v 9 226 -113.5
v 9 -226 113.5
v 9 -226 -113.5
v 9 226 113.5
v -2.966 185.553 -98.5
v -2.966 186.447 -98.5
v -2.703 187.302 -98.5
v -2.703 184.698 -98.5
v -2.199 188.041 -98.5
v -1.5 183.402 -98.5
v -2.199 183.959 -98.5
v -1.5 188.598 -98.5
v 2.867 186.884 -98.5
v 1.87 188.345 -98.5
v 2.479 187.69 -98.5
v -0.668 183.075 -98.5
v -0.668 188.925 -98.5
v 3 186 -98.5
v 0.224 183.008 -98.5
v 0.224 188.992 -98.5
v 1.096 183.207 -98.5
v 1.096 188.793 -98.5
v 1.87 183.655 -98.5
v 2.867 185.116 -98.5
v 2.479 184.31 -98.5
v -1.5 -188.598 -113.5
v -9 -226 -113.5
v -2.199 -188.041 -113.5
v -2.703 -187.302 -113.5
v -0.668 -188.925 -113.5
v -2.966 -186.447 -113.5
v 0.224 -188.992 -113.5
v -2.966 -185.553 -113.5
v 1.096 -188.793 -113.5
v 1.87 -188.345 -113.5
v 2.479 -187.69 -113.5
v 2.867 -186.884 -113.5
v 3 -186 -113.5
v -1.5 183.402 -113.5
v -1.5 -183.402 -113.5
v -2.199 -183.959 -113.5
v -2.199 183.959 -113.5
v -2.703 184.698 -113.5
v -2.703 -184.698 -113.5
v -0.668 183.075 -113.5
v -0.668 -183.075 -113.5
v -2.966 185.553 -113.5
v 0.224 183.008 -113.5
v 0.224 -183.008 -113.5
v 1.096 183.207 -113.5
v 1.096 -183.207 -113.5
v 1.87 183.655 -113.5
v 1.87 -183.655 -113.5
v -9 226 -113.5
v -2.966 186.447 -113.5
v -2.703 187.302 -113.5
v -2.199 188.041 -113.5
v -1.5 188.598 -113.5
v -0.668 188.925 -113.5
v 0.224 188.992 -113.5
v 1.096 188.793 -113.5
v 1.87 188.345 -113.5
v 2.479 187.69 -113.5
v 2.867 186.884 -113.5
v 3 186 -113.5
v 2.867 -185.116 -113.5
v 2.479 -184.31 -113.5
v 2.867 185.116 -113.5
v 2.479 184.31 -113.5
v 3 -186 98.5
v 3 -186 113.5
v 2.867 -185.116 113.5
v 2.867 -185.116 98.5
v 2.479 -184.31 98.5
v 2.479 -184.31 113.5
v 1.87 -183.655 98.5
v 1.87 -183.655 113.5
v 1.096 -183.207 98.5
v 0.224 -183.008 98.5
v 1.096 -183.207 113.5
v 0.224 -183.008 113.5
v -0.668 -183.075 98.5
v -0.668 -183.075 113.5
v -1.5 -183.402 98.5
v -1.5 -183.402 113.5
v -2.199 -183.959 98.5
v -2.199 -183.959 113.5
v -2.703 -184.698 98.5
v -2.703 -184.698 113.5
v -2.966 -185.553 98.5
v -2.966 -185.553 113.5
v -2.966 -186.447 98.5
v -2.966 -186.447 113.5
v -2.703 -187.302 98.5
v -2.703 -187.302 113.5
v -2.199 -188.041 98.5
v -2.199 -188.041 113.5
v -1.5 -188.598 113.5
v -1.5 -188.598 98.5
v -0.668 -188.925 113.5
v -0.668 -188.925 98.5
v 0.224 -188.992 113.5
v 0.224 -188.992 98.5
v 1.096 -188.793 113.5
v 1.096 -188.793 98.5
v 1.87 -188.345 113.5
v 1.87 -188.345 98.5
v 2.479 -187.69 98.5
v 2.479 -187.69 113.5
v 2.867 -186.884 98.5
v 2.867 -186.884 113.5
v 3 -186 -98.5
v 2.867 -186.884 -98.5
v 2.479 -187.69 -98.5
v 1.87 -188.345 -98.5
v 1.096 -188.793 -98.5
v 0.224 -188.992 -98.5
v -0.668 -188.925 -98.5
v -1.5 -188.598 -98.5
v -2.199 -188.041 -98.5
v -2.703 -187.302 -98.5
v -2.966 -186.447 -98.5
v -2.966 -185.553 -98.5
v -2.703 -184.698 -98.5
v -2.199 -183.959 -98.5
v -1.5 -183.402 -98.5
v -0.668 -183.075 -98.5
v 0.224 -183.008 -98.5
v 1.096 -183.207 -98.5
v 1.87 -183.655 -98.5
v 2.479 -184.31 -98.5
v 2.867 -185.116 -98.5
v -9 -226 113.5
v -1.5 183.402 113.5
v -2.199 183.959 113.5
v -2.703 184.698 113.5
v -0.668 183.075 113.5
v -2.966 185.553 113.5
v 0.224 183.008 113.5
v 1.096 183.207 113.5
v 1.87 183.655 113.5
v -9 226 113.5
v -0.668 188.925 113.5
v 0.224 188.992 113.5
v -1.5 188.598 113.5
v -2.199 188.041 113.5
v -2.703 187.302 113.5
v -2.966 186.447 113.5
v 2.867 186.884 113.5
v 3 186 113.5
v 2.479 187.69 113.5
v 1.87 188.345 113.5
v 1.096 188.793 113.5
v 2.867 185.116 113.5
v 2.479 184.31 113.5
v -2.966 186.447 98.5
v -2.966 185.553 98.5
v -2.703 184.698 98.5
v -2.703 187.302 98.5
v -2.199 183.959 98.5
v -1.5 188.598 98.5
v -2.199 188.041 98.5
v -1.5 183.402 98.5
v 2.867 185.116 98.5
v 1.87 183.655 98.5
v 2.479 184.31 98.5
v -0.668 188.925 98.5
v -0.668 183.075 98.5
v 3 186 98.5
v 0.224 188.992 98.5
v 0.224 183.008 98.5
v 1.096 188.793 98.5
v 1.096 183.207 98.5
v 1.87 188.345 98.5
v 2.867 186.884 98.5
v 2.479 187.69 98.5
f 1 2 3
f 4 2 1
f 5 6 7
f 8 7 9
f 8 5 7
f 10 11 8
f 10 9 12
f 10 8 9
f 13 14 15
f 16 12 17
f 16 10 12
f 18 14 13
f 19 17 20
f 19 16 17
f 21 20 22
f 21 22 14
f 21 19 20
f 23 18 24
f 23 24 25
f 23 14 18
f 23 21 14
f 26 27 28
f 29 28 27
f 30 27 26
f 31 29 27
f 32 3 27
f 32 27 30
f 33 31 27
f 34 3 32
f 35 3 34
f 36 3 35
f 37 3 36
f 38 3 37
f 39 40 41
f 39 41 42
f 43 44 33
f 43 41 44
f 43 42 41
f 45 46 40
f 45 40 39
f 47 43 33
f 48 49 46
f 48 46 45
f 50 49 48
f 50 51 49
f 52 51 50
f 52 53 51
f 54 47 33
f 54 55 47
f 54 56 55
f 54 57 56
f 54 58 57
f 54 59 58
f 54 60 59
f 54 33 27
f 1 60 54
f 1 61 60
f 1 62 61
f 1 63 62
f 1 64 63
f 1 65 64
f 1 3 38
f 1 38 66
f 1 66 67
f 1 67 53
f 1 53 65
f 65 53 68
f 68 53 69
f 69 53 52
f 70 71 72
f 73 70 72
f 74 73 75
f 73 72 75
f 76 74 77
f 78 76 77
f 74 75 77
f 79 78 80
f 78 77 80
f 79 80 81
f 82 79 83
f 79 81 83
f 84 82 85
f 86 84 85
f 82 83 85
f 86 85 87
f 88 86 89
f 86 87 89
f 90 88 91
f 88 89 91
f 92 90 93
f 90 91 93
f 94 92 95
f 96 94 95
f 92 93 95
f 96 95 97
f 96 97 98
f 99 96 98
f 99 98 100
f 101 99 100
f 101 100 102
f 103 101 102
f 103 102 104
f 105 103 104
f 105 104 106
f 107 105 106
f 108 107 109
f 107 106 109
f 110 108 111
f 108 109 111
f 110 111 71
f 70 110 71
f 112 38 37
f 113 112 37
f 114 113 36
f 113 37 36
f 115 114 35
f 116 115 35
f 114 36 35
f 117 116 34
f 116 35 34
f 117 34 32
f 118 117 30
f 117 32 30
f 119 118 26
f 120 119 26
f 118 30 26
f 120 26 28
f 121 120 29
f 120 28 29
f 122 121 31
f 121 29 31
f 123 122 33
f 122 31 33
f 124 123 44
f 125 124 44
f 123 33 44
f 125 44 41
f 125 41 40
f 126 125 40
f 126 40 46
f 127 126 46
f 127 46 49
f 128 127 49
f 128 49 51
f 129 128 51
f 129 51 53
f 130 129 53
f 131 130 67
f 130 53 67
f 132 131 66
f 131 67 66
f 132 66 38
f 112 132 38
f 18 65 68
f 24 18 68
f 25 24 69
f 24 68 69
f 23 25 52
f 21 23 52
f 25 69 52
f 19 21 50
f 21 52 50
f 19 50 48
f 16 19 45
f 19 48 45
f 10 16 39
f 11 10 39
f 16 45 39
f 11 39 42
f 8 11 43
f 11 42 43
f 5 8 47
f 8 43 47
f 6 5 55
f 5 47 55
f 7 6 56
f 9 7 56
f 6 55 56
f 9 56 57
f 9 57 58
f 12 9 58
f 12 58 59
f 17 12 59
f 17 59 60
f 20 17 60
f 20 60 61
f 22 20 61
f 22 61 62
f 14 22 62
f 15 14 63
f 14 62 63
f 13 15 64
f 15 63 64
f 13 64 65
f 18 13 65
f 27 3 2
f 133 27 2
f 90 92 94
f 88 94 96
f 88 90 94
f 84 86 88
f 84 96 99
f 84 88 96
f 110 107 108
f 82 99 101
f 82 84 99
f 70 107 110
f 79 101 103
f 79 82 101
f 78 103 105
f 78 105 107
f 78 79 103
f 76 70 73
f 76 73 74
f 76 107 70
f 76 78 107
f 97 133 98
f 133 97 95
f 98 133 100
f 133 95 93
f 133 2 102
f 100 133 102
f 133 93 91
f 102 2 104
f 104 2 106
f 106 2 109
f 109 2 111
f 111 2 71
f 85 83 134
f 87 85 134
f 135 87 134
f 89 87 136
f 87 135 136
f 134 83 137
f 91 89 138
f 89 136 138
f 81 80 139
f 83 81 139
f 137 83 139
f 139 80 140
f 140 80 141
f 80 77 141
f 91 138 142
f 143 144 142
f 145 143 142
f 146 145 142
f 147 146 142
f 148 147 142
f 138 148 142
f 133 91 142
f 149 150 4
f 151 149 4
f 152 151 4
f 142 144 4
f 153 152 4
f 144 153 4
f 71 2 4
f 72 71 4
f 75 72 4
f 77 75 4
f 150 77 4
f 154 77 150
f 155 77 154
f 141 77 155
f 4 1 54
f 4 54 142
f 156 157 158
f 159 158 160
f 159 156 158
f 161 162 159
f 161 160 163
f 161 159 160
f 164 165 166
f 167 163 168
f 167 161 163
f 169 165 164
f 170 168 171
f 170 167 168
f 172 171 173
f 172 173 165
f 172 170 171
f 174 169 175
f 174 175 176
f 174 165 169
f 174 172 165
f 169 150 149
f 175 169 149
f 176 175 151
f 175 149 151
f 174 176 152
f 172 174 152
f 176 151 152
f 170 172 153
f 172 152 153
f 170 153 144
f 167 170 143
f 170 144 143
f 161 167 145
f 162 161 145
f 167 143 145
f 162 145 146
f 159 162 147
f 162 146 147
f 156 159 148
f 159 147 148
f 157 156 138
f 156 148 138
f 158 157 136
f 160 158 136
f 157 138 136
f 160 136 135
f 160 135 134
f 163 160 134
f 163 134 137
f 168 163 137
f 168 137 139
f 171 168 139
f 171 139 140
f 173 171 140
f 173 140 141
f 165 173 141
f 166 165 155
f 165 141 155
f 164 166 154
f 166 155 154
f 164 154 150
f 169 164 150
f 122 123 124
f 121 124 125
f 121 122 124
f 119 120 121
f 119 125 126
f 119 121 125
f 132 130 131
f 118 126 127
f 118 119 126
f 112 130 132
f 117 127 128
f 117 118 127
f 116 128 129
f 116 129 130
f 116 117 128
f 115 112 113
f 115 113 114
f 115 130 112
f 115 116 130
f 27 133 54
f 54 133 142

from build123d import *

# Parameters (mm, degrees)
F0_W     = 452
F0_H     = 227
F1_DEPTH = 9
F2_R     = 3
F3_DEPTH = 15
F4_R     = 3
F5_DEPTH = 15


with BuildPart() as f1:
    # F0 (on Right) → F1 (new body, symmetric)
    with BuildSketch(Plane.YZ):
        Rectangle(F0_W, F0_H)
    extrude(amount=F1_DEPTH, both=True)

    # F2 (on face) → F3 (cut)
    with BuildSketch(Plane.XY.offset(113.5)):
        with Locations((0, -186)):
            Circle(F2_R)
        with Locations((0, 186)):
            Circle(F2_R)
    extrude(amount=-F3_DEPTH, mode=Mode.SUBTRACT)

    # F4 (on face) → F5 (cut)
    with BuildSketch(Plane(origin=(0, 0, -113.5), x_dir=(1, 0, 0), z_dir=(0, 0, -1))):
        with Locations((0, 186)):
            Circle(F4_R)
        with Locations((0, -186)):
            Circle(F4_R)
    extrude(amount=-F5_DEPTH, mode=Mode.SUBTRACT)


solid = f1.part
